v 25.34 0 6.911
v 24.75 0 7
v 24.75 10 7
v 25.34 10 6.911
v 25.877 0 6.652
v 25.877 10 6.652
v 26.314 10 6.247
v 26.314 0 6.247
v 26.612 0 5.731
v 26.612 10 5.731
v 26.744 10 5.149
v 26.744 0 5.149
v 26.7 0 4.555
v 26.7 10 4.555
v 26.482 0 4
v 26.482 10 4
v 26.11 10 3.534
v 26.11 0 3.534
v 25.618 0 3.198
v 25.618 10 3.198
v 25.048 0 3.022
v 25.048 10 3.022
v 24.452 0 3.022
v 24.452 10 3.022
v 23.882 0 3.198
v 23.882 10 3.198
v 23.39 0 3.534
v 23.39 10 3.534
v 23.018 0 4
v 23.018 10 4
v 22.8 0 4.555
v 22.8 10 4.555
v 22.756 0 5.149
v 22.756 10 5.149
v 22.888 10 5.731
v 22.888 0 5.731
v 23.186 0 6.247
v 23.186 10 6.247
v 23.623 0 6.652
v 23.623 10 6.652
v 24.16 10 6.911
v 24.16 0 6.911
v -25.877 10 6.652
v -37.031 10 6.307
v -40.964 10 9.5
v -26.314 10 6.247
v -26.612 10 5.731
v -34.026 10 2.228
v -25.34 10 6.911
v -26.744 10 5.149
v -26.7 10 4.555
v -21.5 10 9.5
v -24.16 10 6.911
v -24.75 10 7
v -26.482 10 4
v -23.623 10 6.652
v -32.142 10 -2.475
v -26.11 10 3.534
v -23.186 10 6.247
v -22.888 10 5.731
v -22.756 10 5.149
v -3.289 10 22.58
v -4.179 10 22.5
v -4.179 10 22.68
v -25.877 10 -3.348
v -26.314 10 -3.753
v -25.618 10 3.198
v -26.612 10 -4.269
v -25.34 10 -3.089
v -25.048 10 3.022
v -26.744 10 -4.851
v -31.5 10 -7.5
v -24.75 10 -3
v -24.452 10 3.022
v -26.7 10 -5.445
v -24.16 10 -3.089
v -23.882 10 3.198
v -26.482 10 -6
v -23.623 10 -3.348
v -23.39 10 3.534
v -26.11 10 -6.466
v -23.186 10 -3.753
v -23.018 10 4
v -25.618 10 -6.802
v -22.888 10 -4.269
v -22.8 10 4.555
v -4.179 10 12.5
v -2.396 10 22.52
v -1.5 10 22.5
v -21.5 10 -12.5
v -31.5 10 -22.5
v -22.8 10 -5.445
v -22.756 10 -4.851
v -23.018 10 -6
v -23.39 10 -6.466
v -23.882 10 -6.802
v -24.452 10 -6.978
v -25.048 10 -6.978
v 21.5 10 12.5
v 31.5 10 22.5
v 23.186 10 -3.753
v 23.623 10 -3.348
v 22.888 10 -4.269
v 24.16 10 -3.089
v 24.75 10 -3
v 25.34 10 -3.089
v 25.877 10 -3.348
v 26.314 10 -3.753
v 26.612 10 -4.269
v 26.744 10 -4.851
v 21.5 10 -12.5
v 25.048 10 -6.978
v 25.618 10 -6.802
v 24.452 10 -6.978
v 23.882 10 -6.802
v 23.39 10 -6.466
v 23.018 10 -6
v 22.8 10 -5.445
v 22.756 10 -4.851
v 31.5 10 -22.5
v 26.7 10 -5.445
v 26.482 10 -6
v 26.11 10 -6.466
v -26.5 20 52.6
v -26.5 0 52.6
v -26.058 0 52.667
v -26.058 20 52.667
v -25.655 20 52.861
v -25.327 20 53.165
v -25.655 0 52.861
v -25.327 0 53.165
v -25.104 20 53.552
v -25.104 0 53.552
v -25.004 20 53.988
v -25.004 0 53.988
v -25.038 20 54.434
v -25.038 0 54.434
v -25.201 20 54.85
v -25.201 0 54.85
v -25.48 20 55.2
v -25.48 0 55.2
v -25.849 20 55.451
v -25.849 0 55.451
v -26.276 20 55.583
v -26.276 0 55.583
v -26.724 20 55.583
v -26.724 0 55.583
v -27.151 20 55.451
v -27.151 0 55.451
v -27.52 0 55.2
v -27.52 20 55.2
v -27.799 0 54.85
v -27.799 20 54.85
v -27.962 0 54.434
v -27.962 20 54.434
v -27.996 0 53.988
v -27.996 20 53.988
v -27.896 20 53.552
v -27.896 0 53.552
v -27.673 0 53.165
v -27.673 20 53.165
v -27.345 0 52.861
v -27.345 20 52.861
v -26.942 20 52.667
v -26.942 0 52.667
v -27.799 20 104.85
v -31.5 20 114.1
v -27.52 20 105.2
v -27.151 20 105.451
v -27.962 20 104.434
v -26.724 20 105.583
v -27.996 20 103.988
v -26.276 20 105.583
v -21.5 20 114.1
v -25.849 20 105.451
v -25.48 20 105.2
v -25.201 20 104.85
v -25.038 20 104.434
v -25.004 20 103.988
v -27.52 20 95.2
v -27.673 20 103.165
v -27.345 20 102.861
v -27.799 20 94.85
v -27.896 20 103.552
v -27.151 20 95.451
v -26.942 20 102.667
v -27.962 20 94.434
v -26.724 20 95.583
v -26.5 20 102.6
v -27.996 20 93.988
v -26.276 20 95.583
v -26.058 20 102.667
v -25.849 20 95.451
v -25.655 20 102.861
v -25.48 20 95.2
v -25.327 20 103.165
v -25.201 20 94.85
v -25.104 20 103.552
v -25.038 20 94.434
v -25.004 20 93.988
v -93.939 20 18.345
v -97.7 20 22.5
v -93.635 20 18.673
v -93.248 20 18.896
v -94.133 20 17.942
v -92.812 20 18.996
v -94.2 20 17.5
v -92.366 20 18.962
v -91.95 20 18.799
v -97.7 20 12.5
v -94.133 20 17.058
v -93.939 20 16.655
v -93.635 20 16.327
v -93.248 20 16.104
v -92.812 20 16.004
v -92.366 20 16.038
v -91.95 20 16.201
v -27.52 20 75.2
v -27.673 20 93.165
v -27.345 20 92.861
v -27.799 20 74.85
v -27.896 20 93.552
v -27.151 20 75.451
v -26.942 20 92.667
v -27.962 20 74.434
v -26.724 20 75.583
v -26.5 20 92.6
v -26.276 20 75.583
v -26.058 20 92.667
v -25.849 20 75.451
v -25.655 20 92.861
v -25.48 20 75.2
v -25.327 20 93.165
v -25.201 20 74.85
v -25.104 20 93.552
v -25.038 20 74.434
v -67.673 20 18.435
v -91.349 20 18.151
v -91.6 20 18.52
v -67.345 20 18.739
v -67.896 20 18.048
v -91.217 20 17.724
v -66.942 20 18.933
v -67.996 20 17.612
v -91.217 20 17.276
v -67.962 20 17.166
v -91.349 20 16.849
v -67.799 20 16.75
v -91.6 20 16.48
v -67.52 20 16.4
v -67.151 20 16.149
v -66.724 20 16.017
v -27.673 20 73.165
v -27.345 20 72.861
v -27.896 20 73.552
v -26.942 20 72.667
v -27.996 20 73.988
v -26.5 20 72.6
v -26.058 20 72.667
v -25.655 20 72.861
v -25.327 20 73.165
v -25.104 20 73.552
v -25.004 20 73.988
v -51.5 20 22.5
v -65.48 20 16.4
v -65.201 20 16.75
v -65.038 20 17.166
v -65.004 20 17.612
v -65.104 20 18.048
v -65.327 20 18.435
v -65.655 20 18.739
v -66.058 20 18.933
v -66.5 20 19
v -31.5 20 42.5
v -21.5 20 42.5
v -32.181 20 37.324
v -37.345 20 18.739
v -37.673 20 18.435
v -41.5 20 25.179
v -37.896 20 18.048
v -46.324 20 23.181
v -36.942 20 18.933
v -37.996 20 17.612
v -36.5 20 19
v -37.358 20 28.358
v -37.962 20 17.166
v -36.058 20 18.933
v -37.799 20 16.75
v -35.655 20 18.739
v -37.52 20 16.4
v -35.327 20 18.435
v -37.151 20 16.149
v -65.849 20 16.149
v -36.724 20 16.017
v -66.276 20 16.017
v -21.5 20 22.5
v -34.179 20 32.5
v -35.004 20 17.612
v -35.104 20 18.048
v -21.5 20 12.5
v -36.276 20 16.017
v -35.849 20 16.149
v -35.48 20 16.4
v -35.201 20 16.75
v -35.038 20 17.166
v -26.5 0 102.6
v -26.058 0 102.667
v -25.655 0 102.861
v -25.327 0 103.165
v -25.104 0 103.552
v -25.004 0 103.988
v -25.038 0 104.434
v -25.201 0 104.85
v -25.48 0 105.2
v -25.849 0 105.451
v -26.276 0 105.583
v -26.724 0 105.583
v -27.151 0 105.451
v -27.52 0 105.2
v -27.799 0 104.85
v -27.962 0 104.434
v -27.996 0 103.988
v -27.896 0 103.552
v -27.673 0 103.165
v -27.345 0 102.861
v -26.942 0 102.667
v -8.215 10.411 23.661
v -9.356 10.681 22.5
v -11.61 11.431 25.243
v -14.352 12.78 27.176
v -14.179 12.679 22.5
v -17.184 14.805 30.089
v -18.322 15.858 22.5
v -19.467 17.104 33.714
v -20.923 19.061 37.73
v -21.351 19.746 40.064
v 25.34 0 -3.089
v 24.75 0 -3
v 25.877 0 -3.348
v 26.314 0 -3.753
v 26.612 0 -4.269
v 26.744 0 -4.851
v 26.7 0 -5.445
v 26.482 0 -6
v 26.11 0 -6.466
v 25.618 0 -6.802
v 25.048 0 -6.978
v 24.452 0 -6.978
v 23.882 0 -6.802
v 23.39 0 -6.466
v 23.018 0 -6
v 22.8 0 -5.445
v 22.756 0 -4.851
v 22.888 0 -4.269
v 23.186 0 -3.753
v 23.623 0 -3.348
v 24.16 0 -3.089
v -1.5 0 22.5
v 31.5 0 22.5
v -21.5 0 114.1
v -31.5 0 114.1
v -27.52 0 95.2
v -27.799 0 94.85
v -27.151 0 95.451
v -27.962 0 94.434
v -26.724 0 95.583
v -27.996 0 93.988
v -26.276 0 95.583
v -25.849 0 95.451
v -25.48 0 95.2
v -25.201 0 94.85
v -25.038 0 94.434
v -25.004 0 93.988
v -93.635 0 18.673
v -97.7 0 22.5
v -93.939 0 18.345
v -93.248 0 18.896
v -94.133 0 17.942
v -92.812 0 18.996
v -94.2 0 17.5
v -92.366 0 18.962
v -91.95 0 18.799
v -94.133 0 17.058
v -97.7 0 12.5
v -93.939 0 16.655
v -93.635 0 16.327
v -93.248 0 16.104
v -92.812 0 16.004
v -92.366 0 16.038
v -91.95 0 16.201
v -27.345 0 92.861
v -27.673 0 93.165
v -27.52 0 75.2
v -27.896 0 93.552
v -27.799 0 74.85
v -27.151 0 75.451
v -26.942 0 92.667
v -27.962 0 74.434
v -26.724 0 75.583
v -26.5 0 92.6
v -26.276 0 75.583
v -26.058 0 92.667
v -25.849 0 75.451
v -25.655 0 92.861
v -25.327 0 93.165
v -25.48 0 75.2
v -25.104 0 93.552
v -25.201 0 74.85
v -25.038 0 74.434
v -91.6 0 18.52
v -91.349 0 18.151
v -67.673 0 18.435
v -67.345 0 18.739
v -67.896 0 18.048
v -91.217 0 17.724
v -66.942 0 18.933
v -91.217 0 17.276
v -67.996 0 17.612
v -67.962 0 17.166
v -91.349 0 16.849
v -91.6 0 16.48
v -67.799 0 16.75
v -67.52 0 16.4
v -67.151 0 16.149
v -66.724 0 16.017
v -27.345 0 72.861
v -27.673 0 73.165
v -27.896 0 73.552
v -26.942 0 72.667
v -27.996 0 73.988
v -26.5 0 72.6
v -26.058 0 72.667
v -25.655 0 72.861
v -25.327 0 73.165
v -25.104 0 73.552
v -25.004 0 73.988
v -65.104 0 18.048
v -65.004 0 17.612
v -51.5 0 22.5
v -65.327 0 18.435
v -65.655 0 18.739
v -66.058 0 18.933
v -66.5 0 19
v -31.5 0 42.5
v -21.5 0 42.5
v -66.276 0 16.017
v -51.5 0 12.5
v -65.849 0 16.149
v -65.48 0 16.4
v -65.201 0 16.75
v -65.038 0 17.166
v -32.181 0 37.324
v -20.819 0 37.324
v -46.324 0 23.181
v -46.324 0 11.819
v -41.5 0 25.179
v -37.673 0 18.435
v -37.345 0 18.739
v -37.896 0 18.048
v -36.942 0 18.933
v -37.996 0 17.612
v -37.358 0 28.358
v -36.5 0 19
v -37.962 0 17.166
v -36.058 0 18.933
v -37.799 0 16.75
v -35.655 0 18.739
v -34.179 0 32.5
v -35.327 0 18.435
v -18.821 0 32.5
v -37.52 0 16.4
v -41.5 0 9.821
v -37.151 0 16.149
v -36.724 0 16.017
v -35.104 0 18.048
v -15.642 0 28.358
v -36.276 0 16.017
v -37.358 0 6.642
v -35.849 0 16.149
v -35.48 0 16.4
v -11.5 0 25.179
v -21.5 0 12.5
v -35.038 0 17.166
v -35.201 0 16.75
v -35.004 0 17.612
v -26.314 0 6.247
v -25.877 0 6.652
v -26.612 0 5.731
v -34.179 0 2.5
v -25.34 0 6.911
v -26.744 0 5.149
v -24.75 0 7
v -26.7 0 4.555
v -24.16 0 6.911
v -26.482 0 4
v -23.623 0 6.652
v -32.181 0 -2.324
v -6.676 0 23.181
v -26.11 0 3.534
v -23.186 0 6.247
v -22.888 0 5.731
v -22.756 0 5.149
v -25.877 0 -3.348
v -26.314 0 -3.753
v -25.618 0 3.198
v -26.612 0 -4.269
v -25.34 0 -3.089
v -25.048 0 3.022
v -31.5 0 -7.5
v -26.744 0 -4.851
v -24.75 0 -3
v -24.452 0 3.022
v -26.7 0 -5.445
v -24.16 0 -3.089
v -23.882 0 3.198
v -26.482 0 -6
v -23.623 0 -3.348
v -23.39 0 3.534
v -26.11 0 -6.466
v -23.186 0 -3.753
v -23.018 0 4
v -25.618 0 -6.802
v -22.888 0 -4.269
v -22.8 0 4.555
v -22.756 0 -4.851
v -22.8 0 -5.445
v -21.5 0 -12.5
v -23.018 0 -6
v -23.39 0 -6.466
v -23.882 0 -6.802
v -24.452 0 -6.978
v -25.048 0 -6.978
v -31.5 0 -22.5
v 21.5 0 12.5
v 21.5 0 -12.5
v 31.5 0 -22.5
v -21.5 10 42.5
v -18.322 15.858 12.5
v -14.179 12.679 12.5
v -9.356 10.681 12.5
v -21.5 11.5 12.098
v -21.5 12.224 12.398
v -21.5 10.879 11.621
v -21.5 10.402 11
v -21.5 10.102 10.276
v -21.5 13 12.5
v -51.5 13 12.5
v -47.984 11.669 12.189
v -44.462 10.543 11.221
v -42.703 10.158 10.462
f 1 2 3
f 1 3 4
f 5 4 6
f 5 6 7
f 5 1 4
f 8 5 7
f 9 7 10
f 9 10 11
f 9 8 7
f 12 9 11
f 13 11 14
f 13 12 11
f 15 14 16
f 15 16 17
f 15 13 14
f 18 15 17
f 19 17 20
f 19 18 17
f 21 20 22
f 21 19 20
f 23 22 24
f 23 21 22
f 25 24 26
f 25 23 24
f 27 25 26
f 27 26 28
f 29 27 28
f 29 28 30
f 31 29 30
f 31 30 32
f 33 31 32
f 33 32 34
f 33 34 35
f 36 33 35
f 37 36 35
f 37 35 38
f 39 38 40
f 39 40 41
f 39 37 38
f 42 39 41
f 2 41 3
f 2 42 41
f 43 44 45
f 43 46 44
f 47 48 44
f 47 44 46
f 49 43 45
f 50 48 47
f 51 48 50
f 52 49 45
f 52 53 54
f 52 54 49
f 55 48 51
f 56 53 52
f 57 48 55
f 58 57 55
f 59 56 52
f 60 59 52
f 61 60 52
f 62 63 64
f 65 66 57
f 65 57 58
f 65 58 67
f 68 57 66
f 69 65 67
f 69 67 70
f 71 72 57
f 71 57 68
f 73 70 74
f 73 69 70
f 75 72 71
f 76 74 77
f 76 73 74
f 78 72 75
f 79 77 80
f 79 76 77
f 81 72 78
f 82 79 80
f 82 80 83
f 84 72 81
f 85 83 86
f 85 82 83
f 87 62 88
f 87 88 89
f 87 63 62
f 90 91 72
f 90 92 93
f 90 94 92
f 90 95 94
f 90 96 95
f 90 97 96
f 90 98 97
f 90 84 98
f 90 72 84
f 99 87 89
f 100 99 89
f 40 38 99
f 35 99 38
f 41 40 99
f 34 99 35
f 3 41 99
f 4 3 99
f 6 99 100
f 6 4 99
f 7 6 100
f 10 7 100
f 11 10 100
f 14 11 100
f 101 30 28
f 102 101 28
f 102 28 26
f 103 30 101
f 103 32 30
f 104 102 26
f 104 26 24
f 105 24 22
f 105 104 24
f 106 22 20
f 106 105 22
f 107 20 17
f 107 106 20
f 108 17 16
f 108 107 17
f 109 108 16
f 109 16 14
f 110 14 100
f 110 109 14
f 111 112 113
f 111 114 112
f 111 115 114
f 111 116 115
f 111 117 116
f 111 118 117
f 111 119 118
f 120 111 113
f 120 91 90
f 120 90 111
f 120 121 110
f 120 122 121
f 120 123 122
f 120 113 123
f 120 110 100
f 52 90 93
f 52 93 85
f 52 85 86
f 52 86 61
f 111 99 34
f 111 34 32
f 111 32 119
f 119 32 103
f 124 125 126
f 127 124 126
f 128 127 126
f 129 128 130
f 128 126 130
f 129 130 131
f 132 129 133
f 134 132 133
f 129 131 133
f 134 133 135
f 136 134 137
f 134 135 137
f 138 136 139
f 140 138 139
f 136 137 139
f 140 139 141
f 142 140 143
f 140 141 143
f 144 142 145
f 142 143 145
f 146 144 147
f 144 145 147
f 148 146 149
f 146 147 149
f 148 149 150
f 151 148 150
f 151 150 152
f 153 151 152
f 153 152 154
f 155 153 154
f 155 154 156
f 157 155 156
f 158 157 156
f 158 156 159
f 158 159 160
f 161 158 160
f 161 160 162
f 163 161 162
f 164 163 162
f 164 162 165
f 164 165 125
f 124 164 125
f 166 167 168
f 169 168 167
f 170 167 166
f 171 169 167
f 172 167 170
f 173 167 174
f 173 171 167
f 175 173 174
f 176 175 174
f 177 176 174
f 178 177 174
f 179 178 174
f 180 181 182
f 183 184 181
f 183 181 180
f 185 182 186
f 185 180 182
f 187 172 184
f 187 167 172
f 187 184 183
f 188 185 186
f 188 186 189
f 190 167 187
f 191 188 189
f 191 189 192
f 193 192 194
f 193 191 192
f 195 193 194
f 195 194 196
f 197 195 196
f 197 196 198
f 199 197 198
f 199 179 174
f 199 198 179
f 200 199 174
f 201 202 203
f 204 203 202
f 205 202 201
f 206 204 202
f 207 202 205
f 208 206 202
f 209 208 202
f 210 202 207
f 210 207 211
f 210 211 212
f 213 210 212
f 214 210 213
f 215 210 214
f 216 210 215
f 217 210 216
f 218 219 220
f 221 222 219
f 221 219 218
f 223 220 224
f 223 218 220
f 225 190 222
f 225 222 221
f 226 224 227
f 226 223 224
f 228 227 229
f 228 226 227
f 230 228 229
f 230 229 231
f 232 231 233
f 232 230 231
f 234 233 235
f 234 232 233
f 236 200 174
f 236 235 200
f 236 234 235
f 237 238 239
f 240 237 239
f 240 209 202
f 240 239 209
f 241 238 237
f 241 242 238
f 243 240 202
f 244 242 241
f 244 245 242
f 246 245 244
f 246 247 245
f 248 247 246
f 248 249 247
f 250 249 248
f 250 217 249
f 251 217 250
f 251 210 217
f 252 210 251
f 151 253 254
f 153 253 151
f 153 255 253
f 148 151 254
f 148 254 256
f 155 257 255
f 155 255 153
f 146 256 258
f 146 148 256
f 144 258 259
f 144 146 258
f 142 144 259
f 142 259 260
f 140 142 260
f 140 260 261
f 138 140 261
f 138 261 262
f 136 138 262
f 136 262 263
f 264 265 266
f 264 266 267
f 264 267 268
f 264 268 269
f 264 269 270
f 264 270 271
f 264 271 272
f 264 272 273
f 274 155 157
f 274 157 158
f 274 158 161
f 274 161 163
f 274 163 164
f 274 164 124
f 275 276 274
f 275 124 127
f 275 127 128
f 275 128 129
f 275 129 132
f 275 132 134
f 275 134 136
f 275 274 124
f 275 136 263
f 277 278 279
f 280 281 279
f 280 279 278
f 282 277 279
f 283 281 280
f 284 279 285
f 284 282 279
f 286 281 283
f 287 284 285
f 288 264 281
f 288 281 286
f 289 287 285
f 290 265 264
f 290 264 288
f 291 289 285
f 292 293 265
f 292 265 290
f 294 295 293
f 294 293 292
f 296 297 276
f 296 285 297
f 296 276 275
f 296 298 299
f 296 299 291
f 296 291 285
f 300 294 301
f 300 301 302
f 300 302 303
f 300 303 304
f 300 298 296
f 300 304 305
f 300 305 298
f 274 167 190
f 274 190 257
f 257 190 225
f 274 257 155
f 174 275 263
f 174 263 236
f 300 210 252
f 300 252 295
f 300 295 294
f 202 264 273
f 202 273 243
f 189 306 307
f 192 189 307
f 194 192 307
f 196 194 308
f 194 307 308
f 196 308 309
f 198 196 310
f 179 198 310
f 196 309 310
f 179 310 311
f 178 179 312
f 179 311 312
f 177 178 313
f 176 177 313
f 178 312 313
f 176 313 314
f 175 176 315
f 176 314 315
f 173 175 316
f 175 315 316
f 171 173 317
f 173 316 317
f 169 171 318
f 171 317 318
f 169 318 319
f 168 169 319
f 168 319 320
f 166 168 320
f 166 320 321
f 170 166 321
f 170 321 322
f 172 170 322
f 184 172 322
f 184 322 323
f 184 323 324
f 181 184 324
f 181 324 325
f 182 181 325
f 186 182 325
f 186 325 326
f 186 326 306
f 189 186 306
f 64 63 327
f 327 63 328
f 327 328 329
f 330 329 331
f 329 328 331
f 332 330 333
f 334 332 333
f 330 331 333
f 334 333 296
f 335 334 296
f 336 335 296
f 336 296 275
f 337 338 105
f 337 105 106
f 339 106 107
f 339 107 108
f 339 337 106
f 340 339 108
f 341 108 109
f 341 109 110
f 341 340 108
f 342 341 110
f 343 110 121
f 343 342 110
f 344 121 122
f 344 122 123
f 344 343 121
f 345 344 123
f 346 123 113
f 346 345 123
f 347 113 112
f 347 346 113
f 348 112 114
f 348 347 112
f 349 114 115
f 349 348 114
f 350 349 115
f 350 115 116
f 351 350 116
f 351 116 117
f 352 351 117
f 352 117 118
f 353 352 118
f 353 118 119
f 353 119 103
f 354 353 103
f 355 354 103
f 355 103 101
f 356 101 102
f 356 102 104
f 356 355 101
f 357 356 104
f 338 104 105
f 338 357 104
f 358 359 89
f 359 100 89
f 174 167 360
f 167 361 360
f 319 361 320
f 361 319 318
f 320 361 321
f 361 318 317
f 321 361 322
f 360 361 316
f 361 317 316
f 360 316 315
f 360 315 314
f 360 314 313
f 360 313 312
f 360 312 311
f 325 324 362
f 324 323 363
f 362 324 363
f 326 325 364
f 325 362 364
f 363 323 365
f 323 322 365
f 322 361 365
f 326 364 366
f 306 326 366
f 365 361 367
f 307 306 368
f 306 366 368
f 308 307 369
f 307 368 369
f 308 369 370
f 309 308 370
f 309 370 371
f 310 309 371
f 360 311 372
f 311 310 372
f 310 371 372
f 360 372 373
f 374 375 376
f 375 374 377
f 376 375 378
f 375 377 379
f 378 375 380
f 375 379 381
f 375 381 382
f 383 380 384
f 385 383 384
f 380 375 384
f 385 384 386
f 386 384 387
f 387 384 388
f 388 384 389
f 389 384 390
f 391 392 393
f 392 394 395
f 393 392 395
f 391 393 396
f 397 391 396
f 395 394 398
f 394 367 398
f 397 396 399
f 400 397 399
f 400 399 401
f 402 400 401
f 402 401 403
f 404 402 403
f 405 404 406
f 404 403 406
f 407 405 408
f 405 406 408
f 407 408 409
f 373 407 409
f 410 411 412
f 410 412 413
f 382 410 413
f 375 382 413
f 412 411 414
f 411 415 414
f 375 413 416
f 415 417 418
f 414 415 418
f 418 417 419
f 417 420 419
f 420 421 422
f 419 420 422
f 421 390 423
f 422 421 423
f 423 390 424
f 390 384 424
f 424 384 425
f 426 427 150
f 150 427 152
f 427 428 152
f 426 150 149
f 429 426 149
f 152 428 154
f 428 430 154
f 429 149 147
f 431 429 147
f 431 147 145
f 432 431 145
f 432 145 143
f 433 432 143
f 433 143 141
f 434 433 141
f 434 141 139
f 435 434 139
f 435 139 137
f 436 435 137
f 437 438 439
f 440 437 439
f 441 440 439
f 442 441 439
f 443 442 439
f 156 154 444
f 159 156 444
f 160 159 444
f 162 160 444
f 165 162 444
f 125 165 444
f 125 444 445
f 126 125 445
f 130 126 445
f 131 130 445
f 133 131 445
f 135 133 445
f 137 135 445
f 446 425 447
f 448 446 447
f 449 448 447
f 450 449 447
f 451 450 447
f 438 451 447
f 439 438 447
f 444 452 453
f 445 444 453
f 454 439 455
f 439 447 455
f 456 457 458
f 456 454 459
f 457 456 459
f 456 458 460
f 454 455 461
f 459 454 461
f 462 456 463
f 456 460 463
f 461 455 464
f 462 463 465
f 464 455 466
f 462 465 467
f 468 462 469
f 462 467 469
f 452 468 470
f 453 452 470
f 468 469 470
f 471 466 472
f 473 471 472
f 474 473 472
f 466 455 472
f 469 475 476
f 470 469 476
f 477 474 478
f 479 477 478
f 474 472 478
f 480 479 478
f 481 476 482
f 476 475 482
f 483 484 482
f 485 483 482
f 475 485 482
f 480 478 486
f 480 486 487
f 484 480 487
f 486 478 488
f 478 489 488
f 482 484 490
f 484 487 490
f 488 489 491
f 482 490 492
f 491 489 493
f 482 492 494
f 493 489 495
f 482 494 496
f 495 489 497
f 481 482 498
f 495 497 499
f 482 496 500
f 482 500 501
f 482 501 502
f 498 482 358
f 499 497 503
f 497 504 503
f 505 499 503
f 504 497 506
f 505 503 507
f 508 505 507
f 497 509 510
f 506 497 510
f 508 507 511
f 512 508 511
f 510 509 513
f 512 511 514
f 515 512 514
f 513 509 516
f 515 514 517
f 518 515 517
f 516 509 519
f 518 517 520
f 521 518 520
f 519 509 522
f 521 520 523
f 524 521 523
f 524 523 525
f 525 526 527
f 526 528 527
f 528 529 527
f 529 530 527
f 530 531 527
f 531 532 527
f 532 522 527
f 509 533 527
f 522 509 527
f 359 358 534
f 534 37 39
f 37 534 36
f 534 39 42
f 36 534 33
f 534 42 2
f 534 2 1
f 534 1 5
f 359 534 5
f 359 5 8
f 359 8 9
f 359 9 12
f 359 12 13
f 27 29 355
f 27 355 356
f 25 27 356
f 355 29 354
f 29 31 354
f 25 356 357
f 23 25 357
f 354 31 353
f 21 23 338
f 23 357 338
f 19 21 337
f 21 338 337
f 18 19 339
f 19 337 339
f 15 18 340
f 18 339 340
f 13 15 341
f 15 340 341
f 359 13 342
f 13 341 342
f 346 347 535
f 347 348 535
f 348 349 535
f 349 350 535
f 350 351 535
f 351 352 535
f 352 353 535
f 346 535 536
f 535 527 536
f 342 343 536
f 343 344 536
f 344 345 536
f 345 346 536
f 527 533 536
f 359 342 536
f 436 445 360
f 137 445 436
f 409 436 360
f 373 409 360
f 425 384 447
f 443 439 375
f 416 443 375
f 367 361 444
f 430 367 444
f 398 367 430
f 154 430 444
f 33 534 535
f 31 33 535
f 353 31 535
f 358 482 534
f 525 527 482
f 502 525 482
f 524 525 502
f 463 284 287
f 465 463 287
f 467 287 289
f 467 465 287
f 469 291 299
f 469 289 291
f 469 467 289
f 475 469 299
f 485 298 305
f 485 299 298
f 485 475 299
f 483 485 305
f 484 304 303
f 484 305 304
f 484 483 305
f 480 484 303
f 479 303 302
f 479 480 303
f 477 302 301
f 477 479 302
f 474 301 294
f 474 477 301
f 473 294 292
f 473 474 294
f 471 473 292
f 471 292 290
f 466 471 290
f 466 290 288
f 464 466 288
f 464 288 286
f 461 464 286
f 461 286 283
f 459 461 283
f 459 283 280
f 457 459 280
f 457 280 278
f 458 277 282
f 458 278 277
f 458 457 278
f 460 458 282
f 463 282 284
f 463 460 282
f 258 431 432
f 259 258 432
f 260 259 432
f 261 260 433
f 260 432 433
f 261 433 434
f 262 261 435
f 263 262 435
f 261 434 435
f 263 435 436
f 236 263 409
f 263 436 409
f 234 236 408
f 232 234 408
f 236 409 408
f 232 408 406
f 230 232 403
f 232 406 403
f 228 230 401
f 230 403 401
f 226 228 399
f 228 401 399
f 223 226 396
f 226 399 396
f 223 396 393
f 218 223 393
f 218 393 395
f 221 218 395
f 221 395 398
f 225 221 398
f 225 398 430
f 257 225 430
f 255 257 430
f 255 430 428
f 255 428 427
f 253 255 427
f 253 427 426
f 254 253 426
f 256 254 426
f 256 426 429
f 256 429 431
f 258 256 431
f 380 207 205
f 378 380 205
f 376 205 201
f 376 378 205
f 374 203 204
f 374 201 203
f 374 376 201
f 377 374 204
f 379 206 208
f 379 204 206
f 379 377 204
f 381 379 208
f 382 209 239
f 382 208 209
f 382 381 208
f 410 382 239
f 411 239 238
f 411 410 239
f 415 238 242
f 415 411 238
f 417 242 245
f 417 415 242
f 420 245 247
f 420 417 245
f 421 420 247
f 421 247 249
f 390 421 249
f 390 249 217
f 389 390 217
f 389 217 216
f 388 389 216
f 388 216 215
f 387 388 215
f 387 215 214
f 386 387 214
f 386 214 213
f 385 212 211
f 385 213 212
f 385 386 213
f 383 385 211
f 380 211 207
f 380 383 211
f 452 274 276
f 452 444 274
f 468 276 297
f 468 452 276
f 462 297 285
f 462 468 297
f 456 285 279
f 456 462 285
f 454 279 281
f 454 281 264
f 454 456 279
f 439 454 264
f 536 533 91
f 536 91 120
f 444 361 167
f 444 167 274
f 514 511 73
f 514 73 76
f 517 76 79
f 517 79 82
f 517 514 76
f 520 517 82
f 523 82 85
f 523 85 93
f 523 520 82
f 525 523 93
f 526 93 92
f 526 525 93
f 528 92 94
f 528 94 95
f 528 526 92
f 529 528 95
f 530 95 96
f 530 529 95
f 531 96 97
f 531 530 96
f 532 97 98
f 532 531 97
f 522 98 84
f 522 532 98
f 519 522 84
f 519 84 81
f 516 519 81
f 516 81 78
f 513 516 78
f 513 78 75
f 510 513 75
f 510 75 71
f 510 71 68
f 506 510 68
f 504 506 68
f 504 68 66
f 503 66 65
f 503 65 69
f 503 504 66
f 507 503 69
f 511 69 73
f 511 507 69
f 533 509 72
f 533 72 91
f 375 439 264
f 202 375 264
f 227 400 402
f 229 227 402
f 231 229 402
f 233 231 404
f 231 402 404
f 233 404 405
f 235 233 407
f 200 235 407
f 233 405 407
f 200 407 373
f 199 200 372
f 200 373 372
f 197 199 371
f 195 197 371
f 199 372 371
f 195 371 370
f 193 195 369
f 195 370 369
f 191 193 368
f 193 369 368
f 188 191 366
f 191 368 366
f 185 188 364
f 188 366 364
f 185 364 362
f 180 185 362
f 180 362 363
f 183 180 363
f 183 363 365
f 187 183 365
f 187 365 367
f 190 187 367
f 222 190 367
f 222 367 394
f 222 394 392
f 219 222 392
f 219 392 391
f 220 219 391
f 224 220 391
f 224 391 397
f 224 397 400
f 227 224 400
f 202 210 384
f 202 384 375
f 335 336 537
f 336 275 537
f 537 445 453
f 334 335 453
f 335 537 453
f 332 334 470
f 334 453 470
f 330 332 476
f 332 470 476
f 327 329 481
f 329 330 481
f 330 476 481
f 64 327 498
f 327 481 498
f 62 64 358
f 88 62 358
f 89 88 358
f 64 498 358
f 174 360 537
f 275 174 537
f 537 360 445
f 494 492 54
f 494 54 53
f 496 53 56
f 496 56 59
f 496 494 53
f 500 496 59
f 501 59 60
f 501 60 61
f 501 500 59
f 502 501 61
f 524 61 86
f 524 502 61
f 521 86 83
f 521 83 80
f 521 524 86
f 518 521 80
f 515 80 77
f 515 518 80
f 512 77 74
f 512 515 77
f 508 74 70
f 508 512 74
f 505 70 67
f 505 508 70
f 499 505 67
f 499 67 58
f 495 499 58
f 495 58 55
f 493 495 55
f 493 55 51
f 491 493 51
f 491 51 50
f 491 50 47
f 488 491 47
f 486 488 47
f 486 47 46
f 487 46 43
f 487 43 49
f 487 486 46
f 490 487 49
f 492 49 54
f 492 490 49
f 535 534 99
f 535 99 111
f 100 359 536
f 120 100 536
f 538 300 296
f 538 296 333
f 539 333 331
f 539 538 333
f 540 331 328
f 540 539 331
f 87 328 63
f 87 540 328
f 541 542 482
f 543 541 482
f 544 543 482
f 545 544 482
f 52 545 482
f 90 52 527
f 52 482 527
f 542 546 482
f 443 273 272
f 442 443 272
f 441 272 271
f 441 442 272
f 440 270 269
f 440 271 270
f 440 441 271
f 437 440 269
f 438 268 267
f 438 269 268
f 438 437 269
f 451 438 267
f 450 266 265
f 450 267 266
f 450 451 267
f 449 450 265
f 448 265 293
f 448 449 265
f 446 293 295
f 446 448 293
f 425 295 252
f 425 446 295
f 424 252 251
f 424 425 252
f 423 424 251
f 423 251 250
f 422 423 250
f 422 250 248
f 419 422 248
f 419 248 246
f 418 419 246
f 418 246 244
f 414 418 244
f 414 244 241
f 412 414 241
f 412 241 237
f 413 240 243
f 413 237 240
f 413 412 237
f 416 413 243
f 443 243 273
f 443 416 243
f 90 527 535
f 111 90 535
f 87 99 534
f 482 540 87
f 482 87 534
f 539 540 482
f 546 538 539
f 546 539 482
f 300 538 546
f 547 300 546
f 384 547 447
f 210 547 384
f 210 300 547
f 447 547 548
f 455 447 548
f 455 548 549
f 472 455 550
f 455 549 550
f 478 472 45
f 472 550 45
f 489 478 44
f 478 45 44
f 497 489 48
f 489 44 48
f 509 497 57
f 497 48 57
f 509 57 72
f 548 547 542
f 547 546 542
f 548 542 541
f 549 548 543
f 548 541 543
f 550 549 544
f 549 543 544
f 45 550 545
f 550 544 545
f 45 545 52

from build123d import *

# Parameters (mm, degrees)
SKETCH1_W               = 63
SKETCH1_H               = 45
SKETCH1_R               = 2
SKETCH1_W_2             = 43
SKETCH1_H_2             = 25
BOSS_EXTRUDE1_DEPTH     = 10
SKETCH2_W               = 10
SKETCH2_H               = 20
BOSS_EXTRUDE2_DEPTH     = 76.2
SKETCH3_W               = 10
SKETCH3_H               = 10
BOSS_EXTRUDE3_DEPTH     = 91.6
SKETCH5_W               = 10
SKETCH5_H               = 101.6
BOSS_EXTRUDE4_DEPTH     = 10
CUT_EXTRUDE1_DEPTH      = 158.219909681
CUT_EXTRUDE1_DEPTH_BACK = 158.219909681
SKETCH4_R               = 1.5
FILLET5_R               = 20
FILLET7_R               = 20
FILLET8_R               = 3
FILLET9_START           = 22.5
FILLET9_DEPTH           = 20.0000001
FILLET9_START_2         = 10
FILLET9_2_DEPTH         = 11
FILLET9_3_DEPTH         = 10
SKETCH6_W               = 10
SKETCH6_H               = 20
CUT_EXTRUDE2_DEPTH      = 10
SKETCH7_R               = 1.5
CUT_EXTRUDE3_DEPTH      = 152.539104801


with BuildPart() as part:
    # Sketch1 → Boss-Extrude1 (new body)
    with BuildSketch(Plane(origin=(0, 0, 0), x_dir=(1, 0, 0), z_dir=(0, 1, 0))):
        Rectangle(SKETCH1_W, SKETCH1_H)
        with Locations(Location((-24.75, 5, 0), (0, 0, 270))):
            Circle(SKETCH1_R, mode=Mode.SUBTRACT)
        with Locations(Location((-24.75, -5, 0), (0, 0, 270))):
            Circle(SKETCH1_R, mode=Mode.SUBTRACT)
        with Locations(Location((24.75, 5, 0), (0, 0, 270))):
            Circle(SKETCH1_R, mode=Mode.SUBTRACT)
        with Locations(Location((24.75, -5, 0), (0, 0, 270))):
            Circle(SKETCH1_R, mode=Mode.SUBTRACT)
        Rectangle(SKETCH1_W_2, SKETCH1_H_2, mode=Mode.SUBTRACT)
    extrude(amount=BOSS_EXTRUDE1_DEPTH)

    # Sketch2 → Boss-Extrude2 (add)
    with BuildSketch(Plane.ZY.offset(31.5)):
        with Locations((17.5, 10)):
            Rectangle(SKETCH2_W, SKETCH2_H)
    extrude(amount=BOSS_EXTRUDE2_DEPTH)

    # Sketch3 → Boss-Extrude3 (add)
    with BuildSketch(Plane.XY.offset(22.5)):
        with Locations((-26.5, 5)):
            Rectangle(SKETCH3_W, SKETCH3_H)
    extrude(amount=BOSS_EXTRUDE3_DEPTH)

    # Sketch5 → Boss-Extrude4 (add)
    with BuildSketch(Plane(origin=(0, 10, 0), x_dir=(1, 0, 0), z_dir=(0, 1, 0))):
        with Locations((-26.5, -63.3)):
            Rectangle(SKETCH5_W, SKETCH5_H)
    extrude(amount=BOSS_EXTRUDE4_DEPTH)

    # Sketch4 → Cut-Extrude1 (cut, two sides: drawn at the far end of the back side and taken through both)
    with BuildSketch(Plane(origin=(0, 10, 0), x_dir=(1, 0, 0), z_dir=(0, 1, 0)).offset(-CUT_EXTRUDE1_DEPTH_BACK)):
        with BuildLine():
            ThreePointArc((-91.2, -17.5), (-92.7, -16), (-94.2, -17.5))
            Line((-94.2, -17.5), (-91.2, -17.5))
        make_face()
        with BuildLine():
            Line((-91.2, -17.5), (-94.2, -17.5))
            ThreePointArc((-94.2, -17.5), (-92.7, -19), (-91.2, -17.5))
        make_face()
        with Locations(Location((-66.5, -17.5, 0), (0, 0, 270))):
            Circle(SKETCH4_R)
        with Locations(Location((-36.5, -17.5, 0), (0, 0, 270))):
            Circle(SKETCH4_R)
    extrude(amount=CUT_EXTRUDE1_DEPTH + CUT_EXTRUDE1_DEPTH_BACK, mode=Mode.SUBTRACT)

    # Fillet5
    fillet5_edges = [part.edges().sort_by_distance(p)[0] for p in [
        (-31.5, 5, 12.5),
        (-31.5, 10, 22.5),
    ]]
    fillet(fillet5_edges, radius=FILLET5_R)

    # Fillet7
    # the kernel refuses this fillet: 20 mm, written as the material it adds along each edge
    with BuildSketch(Plane(origin=(-21.5, 10, 12.5), x_dir=(1, 0, 0), z_dir=(0, 0, 1))) as fillet7_piece_1:
        with BuildLine():
            CenterArc((17.320508076, 20), FILLET7_R, 210, 60)
            Line((0, 10), (-0.346410162, 9.8))
            ThreePointArc((-0.346410162, 9.8), (-0.4, 5), (-0.4, 0))
            Line((-0.4, 0), (0, -0.4))
            Line((0, -0.4), (17.320508076, -0.4))
            Line((17.320508076, -0.4), (17.320508076, 0))
        make_face()
    extrude(amount=10)

    # Fillet8
    fillet8_edges = [part.edges().sort_by_distance(p)[0] for p in [
        (-36.5, 10, 12.5),
    ]]
    fillet(fillet8_edges, radius=FILLET8_R)

    # Fillet9: read off the stored shape, not the designer's step
    # Fillet9 outline → Fillet9 (add)
    with BuildSketch(Plane.XY.offset(FILLET9_START)):
        with BuildLine():
            Line((-21.5, 10), (-4.179491924, 10))
            ThreePointArc((-4.179491924, 10), (-14.179495423, 12.679493944), (-21.50000404, 20.000006998))
            Line((-21.50000404, 20.000006998), (-21.5, 10))
        make_face()
    extrude(amount=FILLET9_DEPTH)

    # Fillet9 2 outline → Fillet9 2 (cut)
    with BuildSketch(Plane(origin=(0, 0, 0), x_dir=(1, 0, 0), z_dir=(0, 1, 0)).offset(FILLET9_START_2)):
        with BuildLine():
            ThreePointArc((-1.5, -22.5), (-15.642135624, -28.357864376), (-21.5, -42.5))
            Line((-21.5, -42.5), (0, -42.5000001))
            Line((0, -42.5000001), (0, -22.5))
            Line((0, -22.5), (-1.5, -22.5))
        make_face()
    extrude(amount=FILLET9_2_DEPTH, mode=Mode.SUBTRACT)

    # Fillet9 3 outline → Fillet9 3 (add)
    with BuildSketch(Plane(origin=(0, 0, 0), x_dir=(1, 0, 0), z_dir=(0, 1, 0))):
        with BuildLine():
            Line((-21.5, -22.5), (-21.5, -42.5))
            ThreePointArc((-21.5, -42.5), (-15.642135624, -28.357864376), (-1.5, -22.5))
            Line((-1.5, -22.5), (-21.5, -22.5))
        make_face()
    extrude(amount=FILLET9_3_DEPTH)

    # Sketch6 → Cut-Extrude2 (cut)
    with BuildSketch(Plane.ZY.offset(107.7)):
        with Locations((17.5, 10)):
            Rectangle(SKETCH6_W, SKETCH6_H)
    extrude(amount=-CUT_EXTRUDE2_DEPTH, mode=Mode.SUBTRACT)

    # Sketch7 → Cut-Extrude3 (cut, through all)
    with BuildSketch(Plane(origin=(0, 0, 0), x_dir=(-1, 0, 0), z_dir=(0, -1, 0))):
        with Locations(Location((26.5, -54.1, 0), (0, 0, 90))):
            Circle(SKETCH7_R)
        with Locations(Location((26.5, -94.1, 0), (0, 0, 90))):
            Circle(SKETCH7_R)
        with Locations(Location((26.5, -74.1, 0), (0, 0, 90))):
            Circle(SKETCH7_R)
        with Locations(Location((26.5, -104.1, 0), (0, 0, 90))):
            Circle(SKETCH7_R)
    extrude(amount=-CUT_EXTRUDE3_DEPTH, mode=Mode.SUBTRACT)


solid = part.part
